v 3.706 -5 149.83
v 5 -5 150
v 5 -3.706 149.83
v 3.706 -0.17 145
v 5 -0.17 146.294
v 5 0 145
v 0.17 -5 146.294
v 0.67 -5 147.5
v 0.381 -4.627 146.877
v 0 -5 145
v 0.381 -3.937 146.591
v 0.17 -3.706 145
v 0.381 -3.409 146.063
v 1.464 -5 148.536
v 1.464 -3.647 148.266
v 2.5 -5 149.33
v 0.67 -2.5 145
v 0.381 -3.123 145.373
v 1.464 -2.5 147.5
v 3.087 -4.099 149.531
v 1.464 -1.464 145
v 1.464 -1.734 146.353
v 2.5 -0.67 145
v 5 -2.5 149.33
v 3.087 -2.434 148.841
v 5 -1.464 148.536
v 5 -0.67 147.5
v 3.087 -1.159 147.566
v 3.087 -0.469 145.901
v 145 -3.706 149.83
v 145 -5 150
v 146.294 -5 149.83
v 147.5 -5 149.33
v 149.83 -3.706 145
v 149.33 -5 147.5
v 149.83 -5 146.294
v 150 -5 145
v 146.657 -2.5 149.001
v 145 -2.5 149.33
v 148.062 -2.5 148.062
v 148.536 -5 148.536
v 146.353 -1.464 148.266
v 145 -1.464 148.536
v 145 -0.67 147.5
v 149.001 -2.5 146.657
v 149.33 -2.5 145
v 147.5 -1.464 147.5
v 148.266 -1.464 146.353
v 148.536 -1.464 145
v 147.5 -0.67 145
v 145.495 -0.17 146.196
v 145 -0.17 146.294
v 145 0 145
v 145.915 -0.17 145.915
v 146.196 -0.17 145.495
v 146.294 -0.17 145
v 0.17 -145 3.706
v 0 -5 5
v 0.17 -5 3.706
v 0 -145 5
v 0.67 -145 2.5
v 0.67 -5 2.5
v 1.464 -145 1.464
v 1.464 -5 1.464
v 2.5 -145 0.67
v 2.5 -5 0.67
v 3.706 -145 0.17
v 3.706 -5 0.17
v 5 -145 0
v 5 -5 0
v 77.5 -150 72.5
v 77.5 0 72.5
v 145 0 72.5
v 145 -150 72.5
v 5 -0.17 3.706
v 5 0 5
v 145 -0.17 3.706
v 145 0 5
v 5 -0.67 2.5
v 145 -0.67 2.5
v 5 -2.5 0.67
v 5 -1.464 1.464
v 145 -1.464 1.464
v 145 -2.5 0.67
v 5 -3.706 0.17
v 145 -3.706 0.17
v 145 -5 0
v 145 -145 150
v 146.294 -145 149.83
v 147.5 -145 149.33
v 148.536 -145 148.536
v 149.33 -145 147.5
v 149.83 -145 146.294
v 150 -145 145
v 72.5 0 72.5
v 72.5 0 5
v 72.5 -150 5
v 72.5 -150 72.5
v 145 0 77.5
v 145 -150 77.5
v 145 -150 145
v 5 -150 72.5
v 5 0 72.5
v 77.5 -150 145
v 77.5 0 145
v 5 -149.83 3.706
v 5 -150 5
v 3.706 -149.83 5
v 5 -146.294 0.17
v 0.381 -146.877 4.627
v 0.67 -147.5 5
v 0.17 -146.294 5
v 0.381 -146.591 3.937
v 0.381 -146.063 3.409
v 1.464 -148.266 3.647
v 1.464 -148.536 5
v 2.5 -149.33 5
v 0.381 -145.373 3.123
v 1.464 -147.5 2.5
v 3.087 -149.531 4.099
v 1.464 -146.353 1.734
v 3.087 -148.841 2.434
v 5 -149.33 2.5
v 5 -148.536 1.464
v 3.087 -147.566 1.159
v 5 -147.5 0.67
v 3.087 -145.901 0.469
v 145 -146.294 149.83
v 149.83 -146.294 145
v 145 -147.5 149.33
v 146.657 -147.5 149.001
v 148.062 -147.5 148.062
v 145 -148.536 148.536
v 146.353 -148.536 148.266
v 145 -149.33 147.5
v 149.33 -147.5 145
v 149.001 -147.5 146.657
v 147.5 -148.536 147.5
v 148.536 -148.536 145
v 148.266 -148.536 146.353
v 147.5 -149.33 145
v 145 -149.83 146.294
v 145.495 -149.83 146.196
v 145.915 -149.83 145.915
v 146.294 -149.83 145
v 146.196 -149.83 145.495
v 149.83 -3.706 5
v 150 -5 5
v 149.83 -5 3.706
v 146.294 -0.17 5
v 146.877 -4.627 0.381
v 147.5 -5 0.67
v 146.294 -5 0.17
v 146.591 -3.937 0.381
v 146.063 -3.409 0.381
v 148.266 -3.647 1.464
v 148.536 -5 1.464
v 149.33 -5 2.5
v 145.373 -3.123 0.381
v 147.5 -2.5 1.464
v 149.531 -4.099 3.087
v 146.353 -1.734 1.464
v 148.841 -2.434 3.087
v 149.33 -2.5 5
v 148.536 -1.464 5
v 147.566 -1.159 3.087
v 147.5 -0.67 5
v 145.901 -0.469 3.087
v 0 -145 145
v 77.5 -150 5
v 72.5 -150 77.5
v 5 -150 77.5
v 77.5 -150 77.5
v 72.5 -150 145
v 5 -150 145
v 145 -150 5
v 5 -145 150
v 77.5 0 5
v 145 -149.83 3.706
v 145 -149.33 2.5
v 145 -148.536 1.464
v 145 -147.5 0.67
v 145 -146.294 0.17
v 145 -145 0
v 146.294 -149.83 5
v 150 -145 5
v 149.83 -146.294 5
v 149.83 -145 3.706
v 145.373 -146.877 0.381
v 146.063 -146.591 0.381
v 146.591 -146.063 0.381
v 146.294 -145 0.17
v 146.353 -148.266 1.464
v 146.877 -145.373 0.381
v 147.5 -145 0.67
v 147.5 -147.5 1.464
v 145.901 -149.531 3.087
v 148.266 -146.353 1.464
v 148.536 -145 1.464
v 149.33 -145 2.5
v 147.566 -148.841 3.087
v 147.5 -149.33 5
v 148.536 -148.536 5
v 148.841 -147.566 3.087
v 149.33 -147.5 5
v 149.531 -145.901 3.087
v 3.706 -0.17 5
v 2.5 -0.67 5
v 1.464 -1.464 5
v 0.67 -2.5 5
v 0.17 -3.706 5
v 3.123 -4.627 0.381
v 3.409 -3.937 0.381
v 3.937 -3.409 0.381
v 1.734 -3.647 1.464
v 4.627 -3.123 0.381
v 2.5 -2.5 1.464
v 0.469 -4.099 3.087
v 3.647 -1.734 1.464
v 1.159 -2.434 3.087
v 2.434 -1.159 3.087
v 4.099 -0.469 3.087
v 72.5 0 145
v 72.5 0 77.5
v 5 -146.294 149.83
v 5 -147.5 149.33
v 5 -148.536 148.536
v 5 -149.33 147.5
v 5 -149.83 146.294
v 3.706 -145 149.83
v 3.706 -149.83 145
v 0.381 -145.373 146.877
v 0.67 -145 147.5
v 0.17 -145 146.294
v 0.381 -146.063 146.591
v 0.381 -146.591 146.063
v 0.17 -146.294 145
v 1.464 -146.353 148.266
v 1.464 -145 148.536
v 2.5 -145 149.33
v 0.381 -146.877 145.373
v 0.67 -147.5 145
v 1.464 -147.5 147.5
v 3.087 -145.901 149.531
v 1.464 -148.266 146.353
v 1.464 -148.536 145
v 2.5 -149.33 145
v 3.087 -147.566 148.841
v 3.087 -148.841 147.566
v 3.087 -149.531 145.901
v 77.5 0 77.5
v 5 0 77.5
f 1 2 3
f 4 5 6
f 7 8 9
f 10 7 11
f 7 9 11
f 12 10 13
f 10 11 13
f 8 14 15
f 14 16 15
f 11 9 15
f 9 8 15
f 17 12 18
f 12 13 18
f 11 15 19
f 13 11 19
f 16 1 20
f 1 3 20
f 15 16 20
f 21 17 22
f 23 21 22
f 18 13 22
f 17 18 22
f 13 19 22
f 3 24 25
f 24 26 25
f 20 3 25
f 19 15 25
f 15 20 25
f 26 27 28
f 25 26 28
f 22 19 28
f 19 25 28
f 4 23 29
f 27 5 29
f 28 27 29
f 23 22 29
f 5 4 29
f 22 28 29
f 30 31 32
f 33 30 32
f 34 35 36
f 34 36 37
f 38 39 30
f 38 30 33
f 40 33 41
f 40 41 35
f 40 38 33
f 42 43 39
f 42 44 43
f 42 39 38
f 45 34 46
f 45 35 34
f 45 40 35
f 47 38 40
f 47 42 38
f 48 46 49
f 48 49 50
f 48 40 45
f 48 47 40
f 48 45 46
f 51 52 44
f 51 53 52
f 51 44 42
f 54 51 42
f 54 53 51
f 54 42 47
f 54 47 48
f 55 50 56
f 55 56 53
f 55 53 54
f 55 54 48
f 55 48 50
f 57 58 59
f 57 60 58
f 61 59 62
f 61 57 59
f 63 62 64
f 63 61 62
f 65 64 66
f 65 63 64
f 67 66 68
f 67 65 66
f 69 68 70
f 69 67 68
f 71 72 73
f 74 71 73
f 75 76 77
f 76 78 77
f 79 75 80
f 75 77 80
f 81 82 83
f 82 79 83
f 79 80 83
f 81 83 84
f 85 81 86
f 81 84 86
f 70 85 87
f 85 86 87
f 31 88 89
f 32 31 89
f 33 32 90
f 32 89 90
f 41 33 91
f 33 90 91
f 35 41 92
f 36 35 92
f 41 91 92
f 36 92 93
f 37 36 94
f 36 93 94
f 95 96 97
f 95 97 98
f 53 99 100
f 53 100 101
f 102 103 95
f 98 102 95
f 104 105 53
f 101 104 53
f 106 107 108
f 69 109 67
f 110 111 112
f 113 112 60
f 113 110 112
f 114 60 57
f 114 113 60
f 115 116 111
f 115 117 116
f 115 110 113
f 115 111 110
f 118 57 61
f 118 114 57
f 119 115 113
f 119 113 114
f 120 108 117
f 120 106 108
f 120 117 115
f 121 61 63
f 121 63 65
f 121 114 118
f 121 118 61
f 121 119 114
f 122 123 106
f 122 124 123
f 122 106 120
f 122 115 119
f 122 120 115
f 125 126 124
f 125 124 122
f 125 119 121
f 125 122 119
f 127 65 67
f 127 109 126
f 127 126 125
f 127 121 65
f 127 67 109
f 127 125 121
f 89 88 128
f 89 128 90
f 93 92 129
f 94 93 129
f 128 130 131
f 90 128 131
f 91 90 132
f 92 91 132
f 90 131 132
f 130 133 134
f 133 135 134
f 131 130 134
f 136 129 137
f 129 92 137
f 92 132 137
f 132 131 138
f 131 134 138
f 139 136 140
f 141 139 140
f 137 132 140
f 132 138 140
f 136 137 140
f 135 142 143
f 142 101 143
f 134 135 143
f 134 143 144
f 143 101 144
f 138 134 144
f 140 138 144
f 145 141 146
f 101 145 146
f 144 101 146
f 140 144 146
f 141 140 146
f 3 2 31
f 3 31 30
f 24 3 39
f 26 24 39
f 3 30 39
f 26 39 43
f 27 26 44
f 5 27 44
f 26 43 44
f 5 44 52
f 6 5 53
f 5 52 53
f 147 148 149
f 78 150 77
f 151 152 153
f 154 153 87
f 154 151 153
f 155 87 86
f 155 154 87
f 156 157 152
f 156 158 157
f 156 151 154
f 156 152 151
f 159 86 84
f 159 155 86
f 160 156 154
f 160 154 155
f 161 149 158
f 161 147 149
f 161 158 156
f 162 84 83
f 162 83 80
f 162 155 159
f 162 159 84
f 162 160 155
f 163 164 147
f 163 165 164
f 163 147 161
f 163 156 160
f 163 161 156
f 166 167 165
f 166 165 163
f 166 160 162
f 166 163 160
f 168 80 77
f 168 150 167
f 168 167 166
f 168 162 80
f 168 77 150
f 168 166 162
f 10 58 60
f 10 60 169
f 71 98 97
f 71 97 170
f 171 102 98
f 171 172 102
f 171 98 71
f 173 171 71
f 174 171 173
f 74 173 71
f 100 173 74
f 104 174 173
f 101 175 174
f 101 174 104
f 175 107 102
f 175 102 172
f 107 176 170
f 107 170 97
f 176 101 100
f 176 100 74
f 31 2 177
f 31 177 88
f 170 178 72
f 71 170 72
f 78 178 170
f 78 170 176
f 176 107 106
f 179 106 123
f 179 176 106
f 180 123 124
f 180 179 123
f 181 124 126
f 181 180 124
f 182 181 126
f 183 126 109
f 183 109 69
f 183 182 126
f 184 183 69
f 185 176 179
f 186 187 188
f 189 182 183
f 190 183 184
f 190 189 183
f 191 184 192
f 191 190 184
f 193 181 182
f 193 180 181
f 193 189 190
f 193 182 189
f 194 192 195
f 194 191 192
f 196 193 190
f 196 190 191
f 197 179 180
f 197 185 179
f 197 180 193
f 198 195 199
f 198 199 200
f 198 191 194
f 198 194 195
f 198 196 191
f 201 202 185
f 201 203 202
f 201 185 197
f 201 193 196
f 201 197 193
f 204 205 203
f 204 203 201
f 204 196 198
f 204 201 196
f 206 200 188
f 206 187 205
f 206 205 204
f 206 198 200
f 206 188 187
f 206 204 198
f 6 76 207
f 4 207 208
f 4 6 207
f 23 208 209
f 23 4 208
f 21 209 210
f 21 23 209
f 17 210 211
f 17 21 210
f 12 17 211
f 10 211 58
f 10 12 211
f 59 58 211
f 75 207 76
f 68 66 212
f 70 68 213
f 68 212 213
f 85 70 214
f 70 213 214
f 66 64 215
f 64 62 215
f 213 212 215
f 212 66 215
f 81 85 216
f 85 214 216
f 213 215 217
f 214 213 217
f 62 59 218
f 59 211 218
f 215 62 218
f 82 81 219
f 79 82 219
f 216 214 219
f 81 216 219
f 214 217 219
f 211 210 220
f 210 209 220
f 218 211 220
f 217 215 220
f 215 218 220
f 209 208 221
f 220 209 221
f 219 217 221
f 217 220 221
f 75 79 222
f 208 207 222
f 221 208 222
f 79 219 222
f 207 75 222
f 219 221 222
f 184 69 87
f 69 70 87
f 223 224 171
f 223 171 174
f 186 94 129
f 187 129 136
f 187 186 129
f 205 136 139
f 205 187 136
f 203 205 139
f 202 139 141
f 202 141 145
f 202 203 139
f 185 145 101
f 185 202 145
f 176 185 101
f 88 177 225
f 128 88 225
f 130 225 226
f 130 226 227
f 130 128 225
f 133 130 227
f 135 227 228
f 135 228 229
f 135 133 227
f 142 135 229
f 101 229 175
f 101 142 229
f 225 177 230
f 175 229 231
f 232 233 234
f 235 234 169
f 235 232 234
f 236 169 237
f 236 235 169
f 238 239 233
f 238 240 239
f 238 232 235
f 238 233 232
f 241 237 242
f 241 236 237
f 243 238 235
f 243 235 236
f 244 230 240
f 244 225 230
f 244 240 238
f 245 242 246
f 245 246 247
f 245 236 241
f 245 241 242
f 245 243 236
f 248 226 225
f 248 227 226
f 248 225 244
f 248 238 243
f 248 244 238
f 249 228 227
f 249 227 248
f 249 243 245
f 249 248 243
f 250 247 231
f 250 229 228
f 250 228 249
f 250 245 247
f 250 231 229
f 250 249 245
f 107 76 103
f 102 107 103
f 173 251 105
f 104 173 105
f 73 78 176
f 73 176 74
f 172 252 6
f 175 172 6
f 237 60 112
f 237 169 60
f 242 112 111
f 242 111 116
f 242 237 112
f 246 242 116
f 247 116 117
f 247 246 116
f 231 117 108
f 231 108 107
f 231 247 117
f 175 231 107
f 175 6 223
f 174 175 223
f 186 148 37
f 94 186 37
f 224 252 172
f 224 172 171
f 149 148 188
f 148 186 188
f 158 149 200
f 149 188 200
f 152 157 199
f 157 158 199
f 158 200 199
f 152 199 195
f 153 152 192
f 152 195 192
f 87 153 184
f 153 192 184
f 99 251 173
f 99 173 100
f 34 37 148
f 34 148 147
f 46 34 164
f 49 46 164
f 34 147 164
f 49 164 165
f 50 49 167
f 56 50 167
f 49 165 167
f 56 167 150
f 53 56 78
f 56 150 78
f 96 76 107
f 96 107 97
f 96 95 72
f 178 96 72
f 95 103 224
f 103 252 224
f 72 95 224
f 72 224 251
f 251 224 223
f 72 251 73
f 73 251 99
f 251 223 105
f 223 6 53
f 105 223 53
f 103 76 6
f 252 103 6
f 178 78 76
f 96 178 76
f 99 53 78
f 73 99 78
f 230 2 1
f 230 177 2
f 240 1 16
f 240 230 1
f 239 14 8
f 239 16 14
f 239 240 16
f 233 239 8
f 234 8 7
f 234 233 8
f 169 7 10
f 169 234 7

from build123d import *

# Parameters (mm, degrees)
F0_W     = 150
F0_H     = 150
F0_W_2   = 67.5
F0_H_2   = 67.5
F1_DEPTH = 150
F2_R     = 5
F3_R     = 4.99999


# Not quite as in the source:
# - a fillet or chamfer is up to 0.001 mm smaller than in the source, because OpenCascade refuses the exact size


with BuildPart() as f1:
    # F0 (on Front) → F1 (new body)
    with BuildSketch(Plane.XZ):
        with Locations((75, 75)):
            Rectangle(F0_W, F0_H)
        with Locations((38.75, 38.75)):
            Rectangle(F0_W_2, F0_H_2, mode=Mode.SUBTRACT)
        with Locations((111.25, 38.75)):
            Rectangle(F0_W_2, F0_H_2, mode=Mode.SUBTRACT)
        with Locations((38.75, 111.25)):
            Rectangle(F0_W_2, F0_H_2, mode=Mode.SUBTRACT)
        with Locations((111.25, 111.25)):
            Rectangle(F0_W_2, F0_H_2, mode=Mode.SUBTRACT)
    extrude(amount=F1_DEPTH)

    # F2
    f2_edges = [f1.edges().sort_by_distance(p)[0] for p in [
        (150, -75, 150),
    ]]
    fillet(f2_edges, radius=F2_R)

    # F3 (radius 5 in the source; OpenCascade refuses exactly that, so slightly less here)
    f3_edges = [f1.edges().sort_by_distance(p)[0] for p in [
        (72.5, -150, 150),
        (150, -150, 72.5),
        (72.5, 0, 150),
        (0, -75, 150),
        (75, -150, 0),
        (150, -75, 0),
        (0, -150, 75),
        (150, 0, 72.5),
        (0, 0, 75),
        (0, -75, 0),
        (75, 0, 0),
    ]]
    fillet(f3_edges, radius=F3_R)


solid = f1.part
